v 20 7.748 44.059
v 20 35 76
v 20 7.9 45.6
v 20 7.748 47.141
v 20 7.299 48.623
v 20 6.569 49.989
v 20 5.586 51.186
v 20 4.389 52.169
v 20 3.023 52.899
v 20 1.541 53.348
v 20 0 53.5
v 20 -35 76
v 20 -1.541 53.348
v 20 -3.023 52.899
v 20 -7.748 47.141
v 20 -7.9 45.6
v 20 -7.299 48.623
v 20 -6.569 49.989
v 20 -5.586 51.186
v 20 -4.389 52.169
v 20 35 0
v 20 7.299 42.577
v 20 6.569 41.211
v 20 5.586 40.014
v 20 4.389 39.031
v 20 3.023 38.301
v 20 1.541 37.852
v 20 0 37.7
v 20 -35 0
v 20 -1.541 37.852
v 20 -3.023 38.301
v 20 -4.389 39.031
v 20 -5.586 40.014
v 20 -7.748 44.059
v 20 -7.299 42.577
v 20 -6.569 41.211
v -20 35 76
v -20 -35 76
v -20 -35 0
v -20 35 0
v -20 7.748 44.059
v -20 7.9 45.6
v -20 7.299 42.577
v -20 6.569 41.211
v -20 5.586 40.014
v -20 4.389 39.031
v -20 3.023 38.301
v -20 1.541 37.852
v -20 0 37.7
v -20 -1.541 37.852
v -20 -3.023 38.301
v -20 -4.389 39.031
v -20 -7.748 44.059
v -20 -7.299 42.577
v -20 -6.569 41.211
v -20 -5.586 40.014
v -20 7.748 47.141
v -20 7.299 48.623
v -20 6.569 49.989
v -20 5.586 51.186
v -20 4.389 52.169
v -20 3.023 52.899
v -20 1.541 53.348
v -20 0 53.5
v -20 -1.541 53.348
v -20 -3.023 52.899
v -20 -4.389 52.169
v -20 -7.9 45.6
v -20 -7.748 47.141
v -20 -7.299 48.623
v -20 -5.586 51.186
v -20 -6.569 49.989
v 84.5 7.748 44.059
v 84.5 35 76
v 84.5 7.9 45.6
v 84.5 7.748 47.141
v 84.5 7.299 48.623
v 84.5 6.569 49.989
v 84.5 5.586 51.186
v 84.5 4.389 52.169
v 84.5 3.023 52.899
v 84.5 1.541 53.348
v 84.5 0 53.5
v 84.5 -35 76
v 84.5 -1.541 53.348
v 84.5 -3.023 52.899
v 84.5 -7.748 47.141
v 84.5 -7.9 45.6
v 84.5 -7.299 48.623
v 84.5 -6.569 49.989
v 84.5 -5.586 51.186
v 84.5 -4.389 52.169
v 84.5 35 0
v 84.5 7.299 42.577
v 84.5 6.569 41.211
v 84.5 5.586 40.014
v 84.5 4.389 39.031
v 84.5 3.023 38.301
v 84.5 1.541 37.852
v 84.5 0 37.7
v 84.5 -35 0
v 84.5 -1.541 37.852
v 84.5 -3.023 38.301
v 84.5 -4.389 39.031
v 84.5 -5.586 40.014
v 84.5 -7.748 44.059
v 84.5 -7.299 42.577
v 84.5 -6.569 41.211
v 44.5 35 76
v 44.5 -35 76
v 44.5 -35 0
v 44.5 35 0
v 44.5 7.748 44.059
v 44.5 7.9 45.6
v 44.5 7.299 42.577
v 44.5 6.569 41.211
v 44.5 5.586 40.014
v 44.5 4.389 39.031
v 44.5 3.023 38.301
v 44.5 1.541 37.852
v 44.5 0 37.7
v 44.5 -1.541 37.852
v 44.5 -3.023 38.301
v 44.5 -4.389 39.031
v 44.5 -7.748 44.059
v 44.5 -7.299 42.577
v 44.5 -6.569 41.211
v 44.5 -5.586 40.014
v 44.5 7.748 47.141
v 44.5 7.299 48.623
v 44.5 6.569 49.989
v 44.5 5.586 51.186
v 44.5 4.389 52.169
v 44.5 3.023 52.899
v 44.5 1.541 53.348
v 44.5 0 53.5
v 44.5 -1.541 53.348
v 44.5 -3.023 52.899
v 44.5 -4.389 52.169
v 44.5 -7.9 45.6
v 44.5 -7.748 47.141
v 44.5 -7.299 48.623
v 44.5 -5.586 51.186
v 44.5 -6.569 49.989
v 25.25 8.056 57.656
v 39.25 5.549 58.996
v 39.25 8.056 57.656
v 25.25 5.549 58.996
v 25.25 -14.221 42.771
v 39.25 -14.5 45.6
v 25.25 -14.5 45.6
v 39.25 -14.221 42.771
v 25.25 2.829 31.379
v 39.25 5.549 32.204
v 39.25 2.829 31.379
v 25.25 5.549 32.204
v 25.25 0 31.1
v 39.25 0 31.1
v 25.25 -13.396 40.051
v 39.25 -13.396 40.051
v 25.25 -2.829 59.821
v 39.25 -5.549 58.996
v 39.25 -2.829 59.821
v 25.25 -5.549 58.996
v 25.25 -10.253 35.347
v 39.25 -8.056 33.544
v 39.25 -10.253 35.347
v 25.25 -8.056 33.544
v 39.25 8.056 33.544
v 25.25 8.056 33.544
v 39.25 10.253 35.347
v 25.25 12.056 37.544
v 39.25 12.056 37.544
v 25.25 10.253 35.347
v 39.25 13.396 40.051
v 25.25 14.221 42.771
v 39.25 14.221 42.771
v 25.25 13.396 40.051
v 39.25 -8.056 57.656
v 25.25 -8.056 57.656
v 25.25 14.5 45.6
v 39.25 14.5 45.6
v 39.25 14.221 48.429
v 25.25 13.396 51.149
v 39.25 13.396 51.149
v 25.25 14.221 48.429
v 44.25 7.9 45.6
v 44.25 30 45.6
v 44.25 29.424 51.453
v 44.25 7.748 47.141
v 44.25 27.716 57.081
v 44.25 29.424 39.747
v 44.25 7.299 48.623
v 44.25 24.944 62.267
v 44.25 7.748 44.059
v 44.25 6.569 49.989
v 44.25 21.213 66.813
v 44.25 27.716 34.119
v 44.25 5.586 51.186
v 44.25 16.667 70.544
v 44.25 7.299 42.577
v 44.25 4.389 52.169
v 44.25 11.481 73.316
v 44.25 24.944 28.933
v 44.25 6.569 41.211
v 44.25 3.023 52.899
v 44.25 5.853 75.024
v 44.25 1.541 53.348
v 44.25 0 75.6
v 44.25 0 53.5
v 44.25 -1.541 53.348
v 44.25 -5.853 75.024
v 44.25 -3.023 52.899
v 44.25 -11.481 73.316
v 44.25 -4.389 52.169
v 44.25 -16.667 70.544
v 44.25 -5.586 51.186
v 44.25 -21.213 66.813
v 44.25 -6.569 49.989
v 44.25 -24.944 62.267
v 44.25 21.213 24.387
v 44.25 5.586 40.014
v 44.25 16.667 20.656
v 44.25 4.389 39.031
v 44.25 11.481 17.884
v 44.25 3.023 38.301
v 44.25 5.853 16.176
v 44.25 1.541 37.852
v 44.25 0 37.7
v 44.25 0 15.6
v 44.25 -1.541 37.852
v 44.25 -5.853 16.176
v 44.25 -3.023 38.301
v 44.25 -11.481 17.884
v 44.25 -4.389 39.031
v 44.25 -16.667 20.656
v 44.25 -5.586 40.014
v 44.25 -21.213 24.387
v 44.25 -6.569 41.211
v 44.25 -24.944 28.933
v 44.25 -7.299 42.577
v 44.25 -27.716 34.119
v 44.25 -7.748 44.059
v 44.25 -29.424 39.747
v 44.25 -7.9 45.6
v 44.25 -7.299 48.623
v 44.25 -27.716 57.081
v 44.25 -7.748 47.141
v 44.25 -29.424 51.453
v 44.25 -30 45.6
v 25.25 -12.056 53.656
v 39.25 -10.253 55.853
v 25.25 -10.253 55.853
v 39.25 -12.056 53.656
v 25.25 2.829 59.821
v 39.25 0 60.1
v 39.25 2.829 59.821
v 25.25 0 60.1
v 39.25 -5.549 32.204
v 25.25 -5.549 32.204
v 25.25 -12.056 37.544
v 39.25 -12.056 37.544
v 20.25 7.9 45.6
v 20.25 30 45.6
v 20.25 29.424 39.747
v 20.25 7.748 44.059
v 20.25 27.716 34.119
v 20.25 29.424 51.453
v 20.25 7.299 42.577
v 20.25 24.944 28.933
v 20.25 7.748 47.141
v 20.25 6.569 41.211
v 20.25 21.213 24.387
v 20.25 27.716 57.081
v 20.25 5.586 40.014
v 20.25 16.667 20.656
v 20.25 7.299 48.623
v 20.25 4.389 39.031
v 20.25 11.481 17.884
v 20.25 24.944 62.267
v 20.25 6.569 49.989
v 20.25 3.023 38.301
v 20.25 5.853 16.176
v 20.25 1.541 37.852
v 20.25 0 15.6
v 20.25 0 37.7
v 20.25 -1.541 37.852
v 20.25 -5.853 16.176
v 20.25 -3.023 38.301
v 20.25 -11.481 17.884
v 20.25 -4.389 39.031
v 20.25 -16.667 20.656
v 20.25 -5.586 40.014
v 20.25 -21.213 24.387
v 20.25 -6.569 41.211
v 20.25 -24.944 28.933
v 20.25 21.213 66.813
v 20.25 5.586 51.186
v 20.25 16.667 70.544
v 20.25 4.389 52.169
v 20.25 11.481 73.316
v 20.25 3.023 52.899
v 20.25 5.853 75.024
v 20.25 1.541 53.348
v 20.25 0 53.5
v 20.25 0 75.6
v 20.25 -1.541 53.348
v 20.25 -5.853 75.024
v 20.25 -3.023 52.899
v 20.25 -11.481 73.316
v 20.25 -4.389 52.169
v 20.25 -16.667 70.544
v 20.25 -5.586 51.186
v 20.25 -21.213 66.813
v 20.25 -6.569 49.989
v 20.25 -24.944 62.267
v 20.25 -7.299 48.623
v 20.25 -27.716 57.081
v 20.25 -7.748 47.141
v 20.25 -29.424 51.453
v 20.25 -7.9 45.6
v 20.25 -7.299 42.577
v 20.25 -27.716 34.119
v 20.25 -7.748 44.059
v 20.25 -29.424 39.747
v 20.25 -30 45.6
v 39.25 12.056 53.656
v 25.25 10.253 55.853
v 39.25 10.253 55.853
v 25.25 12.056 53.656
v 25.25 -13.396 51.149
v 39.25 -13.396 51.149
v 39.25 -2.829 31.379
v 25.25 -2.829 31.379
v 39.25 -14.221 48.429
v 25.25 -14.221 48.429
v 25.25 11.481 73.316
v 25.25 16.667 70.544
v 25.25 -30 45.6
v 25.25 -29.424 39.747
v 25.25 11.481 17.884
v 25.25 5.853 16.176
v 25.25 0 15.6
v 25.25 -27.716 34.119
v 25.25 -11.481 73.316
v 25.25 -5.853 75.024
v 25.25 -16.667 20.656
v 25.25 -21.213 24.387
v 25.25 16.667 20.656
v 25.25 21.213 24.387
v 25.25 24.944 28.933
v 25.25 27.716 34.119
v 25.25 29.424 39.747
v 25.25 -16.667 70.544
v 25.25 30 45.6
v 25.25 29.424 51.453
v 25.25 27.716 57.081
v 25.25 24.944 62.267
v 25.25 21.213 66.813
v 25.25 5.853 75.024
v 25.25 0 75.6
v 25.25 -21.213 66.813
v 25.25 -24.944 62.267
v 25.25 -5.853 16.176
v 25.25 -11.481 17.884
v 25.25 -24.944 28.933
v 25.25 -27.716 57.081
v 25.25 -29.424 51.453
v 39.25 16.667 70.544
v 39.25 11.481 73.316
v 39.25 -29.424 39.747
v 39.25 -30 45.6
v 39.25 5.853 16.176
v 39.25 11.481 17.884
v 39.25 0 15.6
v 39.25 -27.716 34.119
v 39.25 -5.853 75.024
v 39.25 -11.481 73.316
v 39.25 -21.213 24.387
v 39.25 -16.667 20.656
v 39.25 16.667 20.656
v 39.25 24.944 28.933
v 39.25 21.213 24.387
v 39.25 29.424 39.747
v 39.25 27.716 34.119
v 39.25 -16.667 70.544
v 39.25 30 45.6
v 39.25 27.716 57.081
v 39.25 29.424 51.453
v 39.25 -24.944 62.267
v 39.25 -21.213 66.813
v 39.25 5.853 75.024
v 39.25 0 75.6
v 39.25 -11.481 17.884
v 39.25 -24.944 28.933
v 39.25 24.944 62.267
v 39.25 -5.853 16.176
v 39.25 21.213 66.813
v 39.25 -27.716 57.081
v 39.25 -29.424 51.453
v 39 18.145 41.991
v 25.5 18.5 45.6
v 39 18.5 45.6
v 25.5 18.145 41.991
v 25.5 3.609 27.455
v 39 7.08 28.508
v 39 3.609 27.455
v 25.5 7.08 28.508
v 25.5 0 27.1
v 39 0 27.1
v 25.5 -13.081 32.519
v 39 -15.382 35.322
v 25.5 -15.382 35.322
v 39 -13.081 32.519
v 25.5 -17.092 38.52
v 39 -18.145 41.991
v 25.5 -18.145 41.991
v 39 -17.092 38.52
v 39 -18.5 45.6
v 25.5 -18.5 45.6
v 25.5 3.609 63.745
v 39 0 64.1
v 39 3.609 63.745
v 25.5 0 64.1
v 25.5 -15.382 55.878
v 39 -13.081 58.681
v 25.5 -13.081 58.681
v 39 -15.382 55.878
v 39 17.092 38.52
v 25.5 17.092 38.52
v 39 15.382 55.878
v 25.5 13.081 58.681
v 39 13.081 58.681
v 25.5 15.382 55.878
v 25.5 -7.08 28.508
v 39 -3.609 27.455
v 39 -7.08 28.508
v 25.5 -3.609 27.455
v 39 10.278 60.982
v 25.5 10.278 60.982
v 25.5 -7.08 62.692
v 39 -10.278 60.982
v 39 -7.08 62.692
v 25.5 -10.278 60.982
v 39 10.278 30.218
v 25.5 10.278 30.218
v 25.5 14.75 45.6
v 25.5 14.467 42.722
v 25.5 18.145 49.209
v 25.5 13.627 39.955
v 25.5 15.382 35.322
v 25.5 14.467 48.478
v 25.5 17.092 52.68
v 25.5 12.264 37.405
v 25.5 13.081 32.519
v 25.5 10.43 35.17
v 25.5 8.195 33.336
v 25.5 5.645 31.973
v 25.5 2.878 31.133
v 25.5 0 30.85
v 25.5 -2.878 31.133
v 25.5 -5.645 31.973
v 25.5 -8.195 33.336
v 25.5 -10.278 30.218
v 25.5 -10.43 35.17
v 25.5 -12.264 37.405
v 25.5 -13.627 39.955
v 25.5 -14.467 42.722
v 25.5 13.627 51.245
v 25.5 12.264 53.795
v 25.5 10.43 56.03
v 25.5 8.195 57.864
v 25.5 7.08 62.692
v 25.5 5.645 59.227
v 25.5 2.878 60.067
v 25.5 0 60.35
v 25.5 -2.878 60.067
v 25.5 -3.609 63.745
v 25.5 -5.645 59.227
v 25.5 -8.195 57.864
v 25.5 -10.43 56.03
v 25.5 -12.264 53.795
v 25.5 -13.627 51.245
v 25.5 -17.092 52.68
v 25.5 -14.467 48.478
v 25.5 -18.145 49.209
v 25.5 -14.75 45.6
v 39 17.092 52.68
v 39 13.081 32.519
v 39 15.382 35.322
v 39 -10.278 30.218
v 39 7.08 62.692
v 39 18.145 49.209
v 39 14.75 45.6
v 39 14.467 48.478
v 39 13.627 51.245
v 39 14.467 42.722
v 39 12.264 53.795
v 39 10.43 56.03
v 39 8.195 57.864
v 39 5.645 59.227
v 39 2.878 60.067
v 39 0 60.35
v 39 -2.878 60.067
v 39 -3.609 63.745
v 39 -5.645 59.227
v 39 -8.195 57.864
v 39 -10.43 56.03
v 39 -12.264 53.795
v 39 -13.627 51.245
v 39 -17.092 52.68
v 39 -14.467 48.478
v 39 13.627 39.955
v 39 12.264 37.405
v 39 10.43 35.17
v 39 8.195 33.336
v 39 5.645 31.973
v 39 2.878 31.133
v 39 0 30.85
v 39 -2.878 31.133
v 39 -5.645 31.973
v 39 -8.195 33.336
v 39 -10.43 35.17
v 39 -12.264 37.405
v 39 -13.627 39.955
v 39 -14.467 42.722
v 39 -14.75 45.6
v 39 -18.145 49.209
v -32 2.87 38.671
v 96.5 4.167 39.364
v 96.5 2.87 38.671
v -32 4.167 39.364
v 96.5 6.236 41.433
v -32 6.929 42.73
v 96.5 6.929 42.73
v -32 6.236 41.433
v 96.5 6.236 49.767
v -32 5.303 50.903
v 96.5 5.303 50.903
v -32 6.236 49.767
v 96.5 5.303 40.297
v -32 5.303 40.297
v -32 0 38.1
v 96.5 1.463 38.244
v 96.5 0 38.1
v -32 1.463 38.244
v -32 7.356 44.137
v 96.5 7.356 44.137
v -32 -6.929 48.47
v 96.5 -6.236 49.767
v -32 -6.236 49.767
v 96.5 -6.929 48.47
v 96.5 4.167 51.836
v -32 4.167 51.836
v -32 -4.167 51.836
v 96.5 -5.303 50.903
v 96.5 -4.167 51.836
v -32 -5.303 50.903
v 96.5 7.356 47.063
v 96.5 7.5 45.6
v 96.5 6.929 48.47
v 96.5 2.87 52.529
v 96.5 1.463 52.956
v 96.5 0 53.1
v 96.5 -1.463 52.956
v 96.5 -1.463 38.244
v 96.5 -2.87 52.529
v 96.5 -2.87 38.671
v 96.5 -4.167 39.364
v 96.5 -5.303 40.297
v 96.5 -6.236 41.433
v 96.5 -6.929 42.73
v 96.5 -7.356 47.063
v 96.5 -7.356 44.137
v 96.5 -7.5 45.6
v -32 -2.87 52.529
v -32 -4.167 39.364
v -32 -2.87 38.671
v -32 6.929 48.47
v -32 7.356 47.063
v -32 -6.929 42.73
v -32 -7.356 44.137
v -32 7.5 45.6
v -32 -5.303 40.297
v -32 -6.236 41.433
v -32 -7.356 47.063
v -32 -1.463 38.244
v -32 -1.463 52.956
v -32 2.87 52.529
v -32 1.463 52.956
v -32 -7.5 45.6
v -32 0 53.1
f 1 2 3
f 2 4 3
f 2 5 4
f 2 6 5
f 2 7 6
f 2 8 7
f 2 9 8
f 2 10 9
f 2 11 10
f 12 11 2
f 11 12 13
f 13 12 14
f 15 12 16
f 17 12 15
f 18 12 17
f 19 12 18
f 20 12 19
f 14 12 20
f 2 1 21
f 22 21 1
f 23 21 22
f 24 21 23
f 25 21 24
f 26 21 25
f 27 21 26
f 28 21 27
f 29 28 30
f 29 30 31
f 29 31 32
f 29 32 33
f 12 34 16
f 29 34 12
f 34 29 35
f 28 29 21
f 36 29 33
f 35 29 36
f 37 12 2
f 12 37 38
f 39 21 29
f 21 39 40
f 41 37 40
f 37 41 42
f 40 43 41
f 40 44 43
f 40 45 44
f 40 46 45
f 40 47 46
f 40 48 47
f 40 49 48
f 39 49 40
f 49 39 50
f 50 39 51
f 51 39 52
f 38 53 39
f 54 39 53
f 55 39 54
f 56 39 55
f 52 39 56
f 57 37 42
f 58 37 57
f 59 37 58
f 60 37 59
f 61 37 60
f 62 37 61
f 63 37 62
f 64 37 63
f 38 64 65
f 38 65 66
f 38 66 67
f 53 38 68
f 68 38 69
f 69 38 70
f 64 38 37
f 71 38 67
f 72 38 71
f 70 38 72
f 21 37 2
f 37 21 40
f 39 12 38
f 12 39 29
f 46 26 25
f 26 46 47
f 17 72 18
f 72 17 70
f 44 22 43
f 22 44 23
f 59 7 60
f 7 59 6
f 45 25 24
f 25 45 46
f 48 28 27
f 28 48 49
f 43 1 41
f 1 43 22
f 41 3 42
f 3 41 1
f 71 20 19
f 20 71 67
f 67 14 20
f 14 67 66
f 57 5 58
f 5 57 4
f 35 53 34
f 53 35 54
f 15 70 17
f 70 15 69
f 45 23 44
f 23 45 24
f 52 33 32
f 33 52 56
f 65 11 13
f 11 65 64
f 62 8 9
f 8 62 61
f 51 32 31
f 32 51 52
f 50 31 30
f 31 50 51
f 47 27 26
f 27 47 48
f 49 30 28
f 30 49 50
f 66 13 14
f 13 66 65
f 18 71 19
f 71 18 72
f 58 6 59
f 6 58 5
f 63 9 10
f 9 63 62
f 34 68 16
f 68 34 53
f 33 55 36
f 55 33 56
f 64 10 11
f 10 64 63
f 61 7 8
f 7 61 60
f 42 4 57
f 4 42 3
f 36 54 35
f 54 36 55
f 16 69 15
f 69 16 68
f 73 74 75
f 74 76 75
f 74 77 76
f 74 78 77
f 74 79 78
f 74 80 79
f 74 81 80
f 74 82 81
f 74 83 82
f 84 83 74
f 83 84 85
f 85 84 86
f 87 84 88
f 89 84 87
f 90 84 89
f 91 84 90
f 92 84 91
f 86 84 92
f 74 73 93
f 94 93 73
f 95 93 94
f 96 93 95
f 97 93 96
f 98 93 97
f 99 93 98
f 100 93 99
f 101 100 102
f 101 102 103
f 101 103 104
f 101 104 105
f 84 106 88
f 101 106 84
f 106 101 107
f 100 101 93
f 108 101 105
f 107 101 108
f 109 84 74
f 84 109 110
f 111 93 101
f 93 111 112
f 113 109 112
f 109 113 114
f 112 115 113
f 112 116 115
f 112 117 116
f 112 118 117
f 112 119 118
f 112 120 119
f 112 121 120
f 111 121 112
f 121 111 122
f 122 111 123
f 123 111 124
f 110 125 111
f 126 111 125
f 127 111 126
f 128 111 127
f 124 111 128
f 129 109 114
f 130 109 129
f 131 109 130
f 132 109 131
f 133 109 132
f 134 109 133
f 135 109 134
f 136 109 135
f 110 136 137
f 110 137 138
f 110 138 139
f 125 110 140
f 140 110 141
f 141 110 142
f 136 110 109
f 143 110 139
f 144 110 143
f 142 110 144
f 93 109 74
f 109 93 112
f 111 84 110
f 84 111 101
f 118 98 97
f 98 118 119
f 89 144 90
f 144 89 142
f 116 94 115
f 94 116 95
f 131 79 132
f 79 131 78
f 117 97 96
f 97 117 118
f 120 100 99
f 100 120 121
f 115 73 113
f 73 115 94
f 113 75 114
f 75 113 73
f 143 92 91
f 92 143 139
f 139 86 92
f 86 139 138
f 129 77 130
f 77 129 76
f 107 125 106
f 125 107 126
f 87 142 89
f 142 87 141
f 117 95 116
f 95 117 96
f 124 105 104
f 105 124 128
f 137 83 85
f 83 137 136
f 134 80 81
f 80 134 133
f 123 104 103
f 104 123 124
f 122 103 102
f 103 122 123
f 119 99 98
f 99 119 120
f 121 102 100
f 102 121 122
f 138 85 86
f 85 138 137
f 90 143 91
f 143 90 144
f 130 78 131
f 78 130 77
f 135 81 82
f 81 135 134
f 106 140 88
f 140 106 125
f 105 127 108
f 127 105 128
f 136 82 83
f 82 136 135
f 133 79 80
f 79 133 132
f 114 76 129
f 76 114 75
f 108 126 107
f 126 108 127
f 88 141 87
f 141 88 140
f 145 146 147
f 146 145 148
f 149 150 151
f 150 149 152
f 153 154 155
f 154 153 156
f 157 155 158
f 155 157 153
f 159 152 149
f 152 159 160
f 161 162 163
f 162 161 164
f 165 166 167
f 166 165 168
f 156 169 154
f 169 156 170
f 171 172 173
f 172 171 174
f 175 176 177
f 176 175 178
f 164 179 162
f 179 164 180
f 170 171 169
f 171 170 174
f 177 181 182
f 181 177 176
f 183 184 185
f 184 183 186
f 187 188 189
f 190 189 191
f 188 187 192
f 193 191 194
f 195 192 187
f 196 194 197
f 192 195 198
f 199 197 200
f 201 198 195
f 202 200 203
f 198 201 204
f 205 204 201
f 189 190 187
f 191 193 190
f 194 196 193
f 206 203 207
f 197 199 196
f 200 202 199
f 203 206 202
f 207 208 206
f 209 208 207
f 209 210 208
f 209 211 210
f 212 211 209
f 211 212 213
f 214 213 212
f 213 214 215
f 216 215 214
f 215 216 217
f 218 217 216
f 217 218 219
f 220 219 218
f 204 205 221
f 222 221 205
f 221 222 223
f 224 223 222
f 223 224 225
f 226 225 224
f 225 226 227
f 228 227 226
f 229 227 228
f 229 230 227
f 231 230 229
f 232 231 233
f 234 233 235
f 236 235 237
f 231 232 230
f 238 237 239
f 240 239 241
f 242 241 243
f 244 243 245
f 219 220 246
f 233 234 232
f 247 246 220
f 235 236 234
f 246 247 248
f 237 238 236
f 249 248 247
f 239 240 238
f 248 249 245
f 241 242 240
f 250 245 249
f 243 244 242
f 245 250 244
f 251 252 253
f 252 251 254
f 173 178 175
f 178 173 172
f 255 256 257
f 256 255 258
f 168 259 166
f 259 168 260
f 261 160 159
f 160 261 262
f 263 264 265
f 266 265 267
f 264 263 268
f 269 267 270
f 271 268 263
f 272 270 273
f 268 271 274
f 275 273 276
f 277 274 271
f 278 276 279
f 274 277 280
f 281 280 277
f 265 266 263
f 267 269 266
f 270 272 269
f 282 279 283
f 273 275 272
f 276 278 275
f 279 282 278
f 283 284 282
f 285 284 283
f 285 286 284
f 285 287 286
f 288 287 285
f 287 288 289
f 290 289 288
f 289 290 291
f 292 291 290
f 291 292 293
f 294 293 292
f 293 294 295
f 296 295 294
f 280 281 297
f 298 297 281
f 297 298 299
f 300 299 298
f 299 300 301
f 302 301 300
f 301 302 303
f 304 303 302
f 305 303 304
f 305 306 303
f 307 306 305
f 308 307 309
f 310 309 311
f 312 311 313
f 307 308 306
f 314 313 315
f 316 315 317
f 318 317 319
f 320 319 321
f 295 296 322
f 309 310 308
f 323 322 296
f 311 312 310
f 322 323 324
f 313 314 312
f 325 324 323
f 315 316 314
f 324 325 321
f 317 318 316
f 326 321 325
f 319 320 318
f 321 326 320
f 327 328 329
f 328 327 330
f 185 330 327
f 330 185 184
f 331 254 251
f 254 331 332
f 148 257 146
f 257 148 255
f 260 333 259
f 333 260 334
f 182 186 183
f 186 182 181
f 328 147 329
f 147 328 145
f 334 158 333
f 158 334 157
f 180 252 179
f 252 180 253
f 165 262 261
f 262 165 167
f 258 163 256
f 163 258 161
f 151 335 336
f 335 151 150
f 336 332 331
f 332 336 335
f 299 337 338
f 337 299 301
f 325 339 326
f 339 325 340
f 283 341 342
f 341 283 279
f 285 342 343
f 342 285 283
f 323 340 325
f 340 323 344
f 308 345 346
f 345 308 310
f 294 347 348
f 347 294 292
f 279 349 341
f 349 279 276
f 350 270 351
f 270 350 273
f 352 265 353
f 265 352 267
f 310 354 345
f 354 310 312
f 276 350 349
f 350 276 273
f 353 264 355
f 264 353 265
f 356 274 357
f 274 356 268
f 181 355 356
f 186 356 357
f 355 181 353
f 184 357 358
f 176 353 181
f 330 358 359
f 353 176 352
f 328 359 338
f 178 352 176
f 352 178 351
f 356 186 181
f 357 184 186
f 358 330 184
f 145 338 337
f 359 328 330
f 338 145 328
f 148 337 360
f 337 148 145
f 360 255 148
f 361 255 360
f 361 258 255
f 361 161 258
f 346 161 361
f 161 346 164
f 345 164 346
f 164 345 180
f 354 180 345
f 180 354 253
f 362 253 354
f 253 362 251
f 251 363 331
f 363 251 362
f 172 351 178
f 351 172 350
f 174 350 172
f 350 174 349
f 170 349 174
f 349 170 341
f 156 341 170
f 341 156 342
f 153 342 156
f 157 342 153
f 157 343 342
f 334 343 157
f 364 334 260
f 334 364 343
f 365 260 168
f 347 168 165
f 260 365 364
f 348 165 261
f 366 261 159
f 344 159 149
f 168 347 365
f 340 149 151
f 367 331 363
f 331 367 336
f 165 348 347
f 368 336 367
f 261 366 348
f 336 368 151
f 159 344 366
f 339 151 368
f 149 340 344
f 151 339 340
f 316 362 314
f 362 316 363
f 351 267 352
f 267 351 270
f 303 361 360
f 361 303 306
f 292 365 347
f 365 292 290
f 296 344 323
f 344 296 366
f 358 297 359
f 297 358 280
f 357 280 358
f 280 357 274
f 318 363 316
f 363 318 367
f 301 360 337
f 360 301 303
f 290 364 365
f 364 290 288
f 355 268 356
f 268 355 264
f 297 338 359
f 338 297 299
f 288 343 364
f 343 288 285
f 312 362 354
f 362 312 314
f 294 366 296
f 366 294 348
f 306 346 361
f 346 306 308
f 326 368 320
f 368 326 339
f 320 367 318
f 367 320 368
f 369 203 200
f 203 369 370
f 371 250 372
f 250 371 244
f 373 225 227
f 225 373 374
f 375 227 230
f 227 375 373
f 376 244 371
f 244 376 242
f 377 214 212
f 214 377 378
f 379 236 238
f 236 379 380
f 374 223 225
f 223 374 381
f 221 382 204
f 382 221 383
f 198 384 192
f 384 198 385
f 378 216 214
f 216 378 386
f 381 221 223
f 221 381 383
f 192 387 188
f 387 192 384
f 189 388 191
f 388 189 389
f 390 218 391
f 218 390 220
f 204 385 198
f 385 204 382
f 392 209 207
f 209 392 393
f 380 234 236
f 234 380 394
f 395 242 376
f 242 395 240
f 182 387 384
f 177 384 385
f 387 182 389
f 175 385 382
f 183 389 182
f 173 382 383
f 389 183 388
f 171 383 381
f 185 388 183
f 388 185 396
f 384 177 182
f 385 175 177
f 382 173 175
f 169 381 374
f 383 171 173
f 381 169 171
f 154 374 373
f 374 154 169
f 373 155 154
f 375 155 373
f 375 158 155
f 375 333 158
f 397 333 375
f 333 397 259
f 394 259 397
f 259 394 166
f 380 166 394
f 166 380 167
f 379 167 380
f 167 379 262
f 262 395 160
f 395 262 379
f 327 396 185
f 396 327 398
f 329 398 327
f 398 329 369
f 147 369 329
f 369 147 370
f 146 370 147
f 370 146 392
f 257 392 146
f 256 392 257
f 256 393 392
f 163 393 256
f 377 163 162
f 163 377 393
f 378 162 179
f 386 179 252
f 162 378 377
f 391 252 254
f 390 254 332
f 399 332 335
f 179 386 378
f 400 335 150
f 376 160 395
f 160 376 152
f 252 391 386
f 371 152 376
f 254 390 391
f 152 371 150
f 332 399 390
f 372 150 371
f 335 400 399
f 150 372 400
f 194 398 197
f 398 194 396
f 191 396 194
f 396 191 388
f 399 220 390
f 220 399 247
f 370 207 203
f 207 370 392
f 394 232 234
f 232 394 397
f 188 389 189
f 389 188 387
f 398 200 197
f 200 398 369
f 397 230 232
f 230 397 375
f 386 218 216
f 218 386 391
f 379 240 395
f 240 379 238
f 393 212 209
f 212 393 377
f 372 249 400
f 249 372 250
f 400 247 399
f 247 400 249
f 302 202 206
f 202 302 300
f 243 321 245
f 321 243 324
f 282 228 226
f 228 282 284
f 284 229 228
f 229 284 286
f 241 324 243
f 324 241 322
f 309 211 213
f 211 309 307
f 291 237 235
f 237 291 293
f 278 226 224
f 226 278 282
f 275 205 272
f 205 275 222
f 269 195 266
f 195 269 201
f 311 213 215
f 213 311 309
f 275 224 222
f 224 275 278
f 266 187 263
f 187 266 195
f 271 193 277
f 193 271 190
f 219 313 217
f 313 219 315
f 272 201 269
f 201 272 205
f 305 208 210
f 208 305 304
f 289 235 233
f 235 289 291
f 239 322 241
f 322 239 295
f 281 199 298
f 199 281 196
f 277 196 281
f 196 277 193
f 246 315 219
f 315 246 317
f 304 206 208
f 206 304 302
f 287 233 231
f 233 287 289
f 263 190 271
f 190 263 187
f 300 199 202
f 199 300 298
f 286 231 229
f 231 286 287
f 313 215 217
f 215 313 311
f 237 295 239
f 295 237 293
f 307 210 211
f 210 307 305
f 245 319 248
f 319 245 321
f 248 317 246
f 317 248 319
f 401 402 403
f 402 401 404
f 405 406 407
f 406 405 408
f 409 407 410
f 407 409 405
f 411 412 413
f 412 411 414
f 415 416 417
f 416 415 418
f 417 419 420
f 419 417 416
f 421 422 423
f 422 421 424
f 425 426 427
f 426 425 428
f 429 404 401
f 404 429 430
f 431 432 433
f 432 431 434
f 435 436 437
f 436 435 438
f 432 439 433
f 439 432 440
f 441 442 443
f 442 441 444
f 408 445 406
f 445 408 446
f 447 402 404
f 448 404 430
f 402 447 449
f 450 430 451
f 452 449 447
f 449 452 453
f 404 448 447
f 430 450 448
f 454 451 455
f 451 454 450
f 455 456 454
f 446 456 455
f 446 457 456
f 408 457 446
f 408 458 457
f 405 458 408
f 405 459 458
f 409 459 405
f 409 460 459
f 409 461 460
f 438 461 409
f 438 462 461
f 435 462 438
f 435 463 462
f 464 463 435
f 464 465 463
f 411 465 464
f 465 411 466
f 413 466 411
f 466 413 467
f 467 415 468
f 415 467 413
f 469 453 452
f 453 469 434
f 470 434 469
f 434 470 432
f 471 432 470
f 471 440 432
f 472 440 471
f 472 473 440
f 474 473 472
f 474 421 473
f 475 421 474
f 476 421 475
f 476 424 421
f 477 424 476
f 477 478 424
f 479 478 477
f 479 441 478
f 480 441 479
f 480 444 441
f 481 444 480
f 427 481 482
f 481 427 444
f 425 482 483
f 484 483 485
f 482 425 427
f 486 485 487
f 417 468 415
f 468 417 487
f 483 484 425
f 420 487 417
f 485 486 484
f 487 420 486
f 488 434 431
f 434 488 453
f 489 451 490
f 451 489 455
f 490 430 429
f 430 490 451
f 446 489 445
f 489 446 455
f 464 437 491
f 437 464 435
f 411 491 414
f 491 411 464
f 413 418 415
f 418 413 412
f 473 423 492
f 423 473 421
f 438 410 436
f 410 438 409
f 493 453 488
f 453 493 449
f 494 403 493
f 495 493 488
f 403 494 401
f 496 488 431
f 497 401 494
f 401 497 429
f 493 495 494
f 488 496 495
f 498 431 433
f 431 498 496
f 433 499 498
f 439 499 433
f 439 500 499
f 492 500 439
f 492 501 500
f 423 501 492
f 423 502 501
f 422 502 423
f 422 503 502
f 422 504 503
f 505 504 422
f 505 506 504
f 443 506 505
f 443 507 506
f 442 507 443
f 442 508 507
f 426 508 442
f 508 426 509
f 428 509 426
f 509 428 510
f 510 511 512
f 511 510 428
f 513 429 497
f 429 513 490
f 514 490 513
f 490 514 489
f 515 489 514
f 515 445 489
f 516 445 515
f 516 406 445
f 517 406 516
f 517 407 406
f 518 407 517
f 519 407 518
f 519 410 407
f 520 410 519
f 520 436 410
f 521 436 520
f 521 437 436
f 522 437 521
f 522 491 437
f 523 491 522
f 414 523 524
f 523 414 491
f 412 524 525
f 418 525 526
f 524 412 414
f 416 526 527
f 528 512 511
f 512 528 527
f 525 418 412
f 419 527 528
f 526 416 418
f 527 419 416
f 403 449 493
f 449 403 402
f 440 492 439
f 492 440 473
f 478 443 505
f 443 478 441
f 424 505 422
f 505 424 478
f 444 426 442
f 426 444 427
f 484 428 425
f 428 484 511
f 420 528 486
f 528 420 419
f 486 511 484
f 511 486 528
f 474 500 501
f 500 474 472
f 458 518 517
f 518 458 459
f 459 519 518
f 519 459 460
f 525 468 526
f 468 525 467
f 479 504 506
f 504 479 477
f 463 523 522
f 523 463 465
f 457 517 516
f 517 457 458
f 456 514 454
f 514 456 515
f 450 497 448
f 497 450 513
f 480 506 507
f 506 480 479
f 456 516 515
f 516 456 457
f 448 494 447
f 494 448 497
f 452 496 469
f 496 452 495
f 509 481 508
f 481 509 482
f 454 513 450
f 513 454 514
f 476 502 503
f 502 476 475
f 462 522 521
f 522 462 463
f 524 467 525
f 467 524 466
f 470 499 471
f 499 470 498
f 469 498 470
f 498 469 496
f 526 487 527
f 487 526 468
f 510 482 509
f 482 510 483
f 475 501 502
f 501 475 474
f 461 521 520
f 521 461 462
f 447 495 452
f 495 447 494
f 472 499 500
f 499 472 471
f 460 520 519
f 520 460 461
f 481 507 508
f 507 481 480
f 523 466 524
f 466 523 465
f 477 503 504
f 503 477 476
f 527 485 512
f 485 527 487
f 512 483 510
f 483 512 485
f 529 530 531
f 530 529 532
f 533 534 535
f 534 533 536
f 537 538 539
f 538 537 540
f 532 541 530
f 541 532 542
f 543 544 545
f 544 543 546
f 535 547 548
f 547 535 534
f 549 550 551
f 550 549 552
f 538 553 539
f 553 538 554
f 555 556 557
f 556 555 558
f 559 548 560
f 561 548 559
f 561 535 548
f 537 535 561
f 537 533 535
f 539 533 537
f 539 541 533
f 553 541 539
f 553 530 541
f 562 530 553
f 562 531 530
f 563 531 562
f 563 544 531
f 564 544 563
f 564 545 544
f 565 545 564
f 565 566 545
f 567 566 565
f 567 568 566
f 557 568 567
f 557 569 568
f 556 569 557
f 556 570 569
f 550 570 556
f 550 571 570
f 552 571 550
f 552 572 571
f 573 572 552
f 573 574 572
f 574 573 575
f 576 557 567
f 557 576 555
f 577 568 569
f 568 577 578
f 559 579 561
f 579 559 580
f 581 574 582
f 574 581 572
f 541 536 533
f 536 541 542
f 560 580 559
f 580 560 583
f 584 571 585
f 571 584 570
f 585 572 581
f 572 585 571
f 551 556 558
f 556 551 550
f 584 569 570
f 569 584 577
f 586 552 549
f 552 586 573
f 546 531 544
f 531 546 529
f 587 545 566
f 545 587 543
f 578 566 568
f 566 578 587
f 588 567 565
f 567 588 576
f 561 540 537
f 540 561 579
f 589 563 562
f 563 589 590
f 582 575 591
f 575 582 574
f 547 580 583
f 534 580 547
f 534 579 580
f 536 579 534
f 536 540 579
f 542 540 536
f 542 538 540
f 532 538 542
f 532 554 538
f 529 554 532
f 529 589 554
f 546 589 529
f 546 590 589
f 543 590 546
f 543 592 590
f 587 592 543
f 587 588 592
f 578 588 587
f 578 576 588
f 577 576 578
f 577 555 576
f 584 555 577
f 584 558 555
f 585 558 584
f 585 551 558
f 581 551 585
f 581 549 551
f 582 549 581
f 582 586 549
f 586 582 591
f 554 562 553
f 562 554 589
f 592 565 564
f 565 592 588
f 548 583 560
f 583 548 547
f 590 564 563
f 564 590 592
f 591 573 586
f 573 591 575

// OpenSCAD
$fn = 32;

// ------------------------------------------------------------------------
// Pulley assembly: d60 pulley with a belt, shaft d15
// Every part is its own module, assembly() places them once.
// ------------------------------------------------------------------------

// --- part 1 ---
module support1() {
  difference() {
    translate([-20, -35, 0]) cube([40, 70, 76]);
    translate([0, 0, 45.6]) rotate([0, 90, 0]) cylinder(h = 42, d = 15.8, center = true);
  }
}

// --- part 2 ---
module support2() {
  difference() {
    translate([-20, -35, 0]) cube([40, 70, 76]);
    translate([0, 0, 45.6]) rotate([0, 90, 0]) cylinder(h = 42, d = 15.8, center = true);
  }
}

// --- part 3 ---
module shaft() {
  translate([0, 0, -64.25]) cylinder(h = 128.5, d = 15);
}

// --- part 4 ---
module pulley() {
  difference() {
    union() {
      cylinder(h = 24, d = 29);
      cylinder(h = 5, d = 60);
      translate([0, 0, 19]) cylinder(h = 5, d = 60);
    }
    translate([0, 0, -1]) cylinder(h = 26, d = 15.8);
  }
}

// --- part 5 ---
module belt() {
  difference() {
      translate([0, 0, 0]) cylinder(h = 13.5, d = 37);
      translate([0, 0, -1]) cylinder(h = 15.5, d = 29.5);
    }
}

// --- assembly ---
module assembly() {
  translate([0, 0, 0]) rotate([0, 0, 0]) support1();
  translate([64.5, 0, 0]) rotate([0, 0, 0]) support2();
  translate([32.25, 0, 45.6]) rotate([0, 90, 0]) shaft();
  translate([20.25, 0, 45.6]) rotate([0, 90, 0]) pulley();
  translate([25.5, 0, 45.6]) rotate([0, 90, 0]) belt();
}

assembly();
